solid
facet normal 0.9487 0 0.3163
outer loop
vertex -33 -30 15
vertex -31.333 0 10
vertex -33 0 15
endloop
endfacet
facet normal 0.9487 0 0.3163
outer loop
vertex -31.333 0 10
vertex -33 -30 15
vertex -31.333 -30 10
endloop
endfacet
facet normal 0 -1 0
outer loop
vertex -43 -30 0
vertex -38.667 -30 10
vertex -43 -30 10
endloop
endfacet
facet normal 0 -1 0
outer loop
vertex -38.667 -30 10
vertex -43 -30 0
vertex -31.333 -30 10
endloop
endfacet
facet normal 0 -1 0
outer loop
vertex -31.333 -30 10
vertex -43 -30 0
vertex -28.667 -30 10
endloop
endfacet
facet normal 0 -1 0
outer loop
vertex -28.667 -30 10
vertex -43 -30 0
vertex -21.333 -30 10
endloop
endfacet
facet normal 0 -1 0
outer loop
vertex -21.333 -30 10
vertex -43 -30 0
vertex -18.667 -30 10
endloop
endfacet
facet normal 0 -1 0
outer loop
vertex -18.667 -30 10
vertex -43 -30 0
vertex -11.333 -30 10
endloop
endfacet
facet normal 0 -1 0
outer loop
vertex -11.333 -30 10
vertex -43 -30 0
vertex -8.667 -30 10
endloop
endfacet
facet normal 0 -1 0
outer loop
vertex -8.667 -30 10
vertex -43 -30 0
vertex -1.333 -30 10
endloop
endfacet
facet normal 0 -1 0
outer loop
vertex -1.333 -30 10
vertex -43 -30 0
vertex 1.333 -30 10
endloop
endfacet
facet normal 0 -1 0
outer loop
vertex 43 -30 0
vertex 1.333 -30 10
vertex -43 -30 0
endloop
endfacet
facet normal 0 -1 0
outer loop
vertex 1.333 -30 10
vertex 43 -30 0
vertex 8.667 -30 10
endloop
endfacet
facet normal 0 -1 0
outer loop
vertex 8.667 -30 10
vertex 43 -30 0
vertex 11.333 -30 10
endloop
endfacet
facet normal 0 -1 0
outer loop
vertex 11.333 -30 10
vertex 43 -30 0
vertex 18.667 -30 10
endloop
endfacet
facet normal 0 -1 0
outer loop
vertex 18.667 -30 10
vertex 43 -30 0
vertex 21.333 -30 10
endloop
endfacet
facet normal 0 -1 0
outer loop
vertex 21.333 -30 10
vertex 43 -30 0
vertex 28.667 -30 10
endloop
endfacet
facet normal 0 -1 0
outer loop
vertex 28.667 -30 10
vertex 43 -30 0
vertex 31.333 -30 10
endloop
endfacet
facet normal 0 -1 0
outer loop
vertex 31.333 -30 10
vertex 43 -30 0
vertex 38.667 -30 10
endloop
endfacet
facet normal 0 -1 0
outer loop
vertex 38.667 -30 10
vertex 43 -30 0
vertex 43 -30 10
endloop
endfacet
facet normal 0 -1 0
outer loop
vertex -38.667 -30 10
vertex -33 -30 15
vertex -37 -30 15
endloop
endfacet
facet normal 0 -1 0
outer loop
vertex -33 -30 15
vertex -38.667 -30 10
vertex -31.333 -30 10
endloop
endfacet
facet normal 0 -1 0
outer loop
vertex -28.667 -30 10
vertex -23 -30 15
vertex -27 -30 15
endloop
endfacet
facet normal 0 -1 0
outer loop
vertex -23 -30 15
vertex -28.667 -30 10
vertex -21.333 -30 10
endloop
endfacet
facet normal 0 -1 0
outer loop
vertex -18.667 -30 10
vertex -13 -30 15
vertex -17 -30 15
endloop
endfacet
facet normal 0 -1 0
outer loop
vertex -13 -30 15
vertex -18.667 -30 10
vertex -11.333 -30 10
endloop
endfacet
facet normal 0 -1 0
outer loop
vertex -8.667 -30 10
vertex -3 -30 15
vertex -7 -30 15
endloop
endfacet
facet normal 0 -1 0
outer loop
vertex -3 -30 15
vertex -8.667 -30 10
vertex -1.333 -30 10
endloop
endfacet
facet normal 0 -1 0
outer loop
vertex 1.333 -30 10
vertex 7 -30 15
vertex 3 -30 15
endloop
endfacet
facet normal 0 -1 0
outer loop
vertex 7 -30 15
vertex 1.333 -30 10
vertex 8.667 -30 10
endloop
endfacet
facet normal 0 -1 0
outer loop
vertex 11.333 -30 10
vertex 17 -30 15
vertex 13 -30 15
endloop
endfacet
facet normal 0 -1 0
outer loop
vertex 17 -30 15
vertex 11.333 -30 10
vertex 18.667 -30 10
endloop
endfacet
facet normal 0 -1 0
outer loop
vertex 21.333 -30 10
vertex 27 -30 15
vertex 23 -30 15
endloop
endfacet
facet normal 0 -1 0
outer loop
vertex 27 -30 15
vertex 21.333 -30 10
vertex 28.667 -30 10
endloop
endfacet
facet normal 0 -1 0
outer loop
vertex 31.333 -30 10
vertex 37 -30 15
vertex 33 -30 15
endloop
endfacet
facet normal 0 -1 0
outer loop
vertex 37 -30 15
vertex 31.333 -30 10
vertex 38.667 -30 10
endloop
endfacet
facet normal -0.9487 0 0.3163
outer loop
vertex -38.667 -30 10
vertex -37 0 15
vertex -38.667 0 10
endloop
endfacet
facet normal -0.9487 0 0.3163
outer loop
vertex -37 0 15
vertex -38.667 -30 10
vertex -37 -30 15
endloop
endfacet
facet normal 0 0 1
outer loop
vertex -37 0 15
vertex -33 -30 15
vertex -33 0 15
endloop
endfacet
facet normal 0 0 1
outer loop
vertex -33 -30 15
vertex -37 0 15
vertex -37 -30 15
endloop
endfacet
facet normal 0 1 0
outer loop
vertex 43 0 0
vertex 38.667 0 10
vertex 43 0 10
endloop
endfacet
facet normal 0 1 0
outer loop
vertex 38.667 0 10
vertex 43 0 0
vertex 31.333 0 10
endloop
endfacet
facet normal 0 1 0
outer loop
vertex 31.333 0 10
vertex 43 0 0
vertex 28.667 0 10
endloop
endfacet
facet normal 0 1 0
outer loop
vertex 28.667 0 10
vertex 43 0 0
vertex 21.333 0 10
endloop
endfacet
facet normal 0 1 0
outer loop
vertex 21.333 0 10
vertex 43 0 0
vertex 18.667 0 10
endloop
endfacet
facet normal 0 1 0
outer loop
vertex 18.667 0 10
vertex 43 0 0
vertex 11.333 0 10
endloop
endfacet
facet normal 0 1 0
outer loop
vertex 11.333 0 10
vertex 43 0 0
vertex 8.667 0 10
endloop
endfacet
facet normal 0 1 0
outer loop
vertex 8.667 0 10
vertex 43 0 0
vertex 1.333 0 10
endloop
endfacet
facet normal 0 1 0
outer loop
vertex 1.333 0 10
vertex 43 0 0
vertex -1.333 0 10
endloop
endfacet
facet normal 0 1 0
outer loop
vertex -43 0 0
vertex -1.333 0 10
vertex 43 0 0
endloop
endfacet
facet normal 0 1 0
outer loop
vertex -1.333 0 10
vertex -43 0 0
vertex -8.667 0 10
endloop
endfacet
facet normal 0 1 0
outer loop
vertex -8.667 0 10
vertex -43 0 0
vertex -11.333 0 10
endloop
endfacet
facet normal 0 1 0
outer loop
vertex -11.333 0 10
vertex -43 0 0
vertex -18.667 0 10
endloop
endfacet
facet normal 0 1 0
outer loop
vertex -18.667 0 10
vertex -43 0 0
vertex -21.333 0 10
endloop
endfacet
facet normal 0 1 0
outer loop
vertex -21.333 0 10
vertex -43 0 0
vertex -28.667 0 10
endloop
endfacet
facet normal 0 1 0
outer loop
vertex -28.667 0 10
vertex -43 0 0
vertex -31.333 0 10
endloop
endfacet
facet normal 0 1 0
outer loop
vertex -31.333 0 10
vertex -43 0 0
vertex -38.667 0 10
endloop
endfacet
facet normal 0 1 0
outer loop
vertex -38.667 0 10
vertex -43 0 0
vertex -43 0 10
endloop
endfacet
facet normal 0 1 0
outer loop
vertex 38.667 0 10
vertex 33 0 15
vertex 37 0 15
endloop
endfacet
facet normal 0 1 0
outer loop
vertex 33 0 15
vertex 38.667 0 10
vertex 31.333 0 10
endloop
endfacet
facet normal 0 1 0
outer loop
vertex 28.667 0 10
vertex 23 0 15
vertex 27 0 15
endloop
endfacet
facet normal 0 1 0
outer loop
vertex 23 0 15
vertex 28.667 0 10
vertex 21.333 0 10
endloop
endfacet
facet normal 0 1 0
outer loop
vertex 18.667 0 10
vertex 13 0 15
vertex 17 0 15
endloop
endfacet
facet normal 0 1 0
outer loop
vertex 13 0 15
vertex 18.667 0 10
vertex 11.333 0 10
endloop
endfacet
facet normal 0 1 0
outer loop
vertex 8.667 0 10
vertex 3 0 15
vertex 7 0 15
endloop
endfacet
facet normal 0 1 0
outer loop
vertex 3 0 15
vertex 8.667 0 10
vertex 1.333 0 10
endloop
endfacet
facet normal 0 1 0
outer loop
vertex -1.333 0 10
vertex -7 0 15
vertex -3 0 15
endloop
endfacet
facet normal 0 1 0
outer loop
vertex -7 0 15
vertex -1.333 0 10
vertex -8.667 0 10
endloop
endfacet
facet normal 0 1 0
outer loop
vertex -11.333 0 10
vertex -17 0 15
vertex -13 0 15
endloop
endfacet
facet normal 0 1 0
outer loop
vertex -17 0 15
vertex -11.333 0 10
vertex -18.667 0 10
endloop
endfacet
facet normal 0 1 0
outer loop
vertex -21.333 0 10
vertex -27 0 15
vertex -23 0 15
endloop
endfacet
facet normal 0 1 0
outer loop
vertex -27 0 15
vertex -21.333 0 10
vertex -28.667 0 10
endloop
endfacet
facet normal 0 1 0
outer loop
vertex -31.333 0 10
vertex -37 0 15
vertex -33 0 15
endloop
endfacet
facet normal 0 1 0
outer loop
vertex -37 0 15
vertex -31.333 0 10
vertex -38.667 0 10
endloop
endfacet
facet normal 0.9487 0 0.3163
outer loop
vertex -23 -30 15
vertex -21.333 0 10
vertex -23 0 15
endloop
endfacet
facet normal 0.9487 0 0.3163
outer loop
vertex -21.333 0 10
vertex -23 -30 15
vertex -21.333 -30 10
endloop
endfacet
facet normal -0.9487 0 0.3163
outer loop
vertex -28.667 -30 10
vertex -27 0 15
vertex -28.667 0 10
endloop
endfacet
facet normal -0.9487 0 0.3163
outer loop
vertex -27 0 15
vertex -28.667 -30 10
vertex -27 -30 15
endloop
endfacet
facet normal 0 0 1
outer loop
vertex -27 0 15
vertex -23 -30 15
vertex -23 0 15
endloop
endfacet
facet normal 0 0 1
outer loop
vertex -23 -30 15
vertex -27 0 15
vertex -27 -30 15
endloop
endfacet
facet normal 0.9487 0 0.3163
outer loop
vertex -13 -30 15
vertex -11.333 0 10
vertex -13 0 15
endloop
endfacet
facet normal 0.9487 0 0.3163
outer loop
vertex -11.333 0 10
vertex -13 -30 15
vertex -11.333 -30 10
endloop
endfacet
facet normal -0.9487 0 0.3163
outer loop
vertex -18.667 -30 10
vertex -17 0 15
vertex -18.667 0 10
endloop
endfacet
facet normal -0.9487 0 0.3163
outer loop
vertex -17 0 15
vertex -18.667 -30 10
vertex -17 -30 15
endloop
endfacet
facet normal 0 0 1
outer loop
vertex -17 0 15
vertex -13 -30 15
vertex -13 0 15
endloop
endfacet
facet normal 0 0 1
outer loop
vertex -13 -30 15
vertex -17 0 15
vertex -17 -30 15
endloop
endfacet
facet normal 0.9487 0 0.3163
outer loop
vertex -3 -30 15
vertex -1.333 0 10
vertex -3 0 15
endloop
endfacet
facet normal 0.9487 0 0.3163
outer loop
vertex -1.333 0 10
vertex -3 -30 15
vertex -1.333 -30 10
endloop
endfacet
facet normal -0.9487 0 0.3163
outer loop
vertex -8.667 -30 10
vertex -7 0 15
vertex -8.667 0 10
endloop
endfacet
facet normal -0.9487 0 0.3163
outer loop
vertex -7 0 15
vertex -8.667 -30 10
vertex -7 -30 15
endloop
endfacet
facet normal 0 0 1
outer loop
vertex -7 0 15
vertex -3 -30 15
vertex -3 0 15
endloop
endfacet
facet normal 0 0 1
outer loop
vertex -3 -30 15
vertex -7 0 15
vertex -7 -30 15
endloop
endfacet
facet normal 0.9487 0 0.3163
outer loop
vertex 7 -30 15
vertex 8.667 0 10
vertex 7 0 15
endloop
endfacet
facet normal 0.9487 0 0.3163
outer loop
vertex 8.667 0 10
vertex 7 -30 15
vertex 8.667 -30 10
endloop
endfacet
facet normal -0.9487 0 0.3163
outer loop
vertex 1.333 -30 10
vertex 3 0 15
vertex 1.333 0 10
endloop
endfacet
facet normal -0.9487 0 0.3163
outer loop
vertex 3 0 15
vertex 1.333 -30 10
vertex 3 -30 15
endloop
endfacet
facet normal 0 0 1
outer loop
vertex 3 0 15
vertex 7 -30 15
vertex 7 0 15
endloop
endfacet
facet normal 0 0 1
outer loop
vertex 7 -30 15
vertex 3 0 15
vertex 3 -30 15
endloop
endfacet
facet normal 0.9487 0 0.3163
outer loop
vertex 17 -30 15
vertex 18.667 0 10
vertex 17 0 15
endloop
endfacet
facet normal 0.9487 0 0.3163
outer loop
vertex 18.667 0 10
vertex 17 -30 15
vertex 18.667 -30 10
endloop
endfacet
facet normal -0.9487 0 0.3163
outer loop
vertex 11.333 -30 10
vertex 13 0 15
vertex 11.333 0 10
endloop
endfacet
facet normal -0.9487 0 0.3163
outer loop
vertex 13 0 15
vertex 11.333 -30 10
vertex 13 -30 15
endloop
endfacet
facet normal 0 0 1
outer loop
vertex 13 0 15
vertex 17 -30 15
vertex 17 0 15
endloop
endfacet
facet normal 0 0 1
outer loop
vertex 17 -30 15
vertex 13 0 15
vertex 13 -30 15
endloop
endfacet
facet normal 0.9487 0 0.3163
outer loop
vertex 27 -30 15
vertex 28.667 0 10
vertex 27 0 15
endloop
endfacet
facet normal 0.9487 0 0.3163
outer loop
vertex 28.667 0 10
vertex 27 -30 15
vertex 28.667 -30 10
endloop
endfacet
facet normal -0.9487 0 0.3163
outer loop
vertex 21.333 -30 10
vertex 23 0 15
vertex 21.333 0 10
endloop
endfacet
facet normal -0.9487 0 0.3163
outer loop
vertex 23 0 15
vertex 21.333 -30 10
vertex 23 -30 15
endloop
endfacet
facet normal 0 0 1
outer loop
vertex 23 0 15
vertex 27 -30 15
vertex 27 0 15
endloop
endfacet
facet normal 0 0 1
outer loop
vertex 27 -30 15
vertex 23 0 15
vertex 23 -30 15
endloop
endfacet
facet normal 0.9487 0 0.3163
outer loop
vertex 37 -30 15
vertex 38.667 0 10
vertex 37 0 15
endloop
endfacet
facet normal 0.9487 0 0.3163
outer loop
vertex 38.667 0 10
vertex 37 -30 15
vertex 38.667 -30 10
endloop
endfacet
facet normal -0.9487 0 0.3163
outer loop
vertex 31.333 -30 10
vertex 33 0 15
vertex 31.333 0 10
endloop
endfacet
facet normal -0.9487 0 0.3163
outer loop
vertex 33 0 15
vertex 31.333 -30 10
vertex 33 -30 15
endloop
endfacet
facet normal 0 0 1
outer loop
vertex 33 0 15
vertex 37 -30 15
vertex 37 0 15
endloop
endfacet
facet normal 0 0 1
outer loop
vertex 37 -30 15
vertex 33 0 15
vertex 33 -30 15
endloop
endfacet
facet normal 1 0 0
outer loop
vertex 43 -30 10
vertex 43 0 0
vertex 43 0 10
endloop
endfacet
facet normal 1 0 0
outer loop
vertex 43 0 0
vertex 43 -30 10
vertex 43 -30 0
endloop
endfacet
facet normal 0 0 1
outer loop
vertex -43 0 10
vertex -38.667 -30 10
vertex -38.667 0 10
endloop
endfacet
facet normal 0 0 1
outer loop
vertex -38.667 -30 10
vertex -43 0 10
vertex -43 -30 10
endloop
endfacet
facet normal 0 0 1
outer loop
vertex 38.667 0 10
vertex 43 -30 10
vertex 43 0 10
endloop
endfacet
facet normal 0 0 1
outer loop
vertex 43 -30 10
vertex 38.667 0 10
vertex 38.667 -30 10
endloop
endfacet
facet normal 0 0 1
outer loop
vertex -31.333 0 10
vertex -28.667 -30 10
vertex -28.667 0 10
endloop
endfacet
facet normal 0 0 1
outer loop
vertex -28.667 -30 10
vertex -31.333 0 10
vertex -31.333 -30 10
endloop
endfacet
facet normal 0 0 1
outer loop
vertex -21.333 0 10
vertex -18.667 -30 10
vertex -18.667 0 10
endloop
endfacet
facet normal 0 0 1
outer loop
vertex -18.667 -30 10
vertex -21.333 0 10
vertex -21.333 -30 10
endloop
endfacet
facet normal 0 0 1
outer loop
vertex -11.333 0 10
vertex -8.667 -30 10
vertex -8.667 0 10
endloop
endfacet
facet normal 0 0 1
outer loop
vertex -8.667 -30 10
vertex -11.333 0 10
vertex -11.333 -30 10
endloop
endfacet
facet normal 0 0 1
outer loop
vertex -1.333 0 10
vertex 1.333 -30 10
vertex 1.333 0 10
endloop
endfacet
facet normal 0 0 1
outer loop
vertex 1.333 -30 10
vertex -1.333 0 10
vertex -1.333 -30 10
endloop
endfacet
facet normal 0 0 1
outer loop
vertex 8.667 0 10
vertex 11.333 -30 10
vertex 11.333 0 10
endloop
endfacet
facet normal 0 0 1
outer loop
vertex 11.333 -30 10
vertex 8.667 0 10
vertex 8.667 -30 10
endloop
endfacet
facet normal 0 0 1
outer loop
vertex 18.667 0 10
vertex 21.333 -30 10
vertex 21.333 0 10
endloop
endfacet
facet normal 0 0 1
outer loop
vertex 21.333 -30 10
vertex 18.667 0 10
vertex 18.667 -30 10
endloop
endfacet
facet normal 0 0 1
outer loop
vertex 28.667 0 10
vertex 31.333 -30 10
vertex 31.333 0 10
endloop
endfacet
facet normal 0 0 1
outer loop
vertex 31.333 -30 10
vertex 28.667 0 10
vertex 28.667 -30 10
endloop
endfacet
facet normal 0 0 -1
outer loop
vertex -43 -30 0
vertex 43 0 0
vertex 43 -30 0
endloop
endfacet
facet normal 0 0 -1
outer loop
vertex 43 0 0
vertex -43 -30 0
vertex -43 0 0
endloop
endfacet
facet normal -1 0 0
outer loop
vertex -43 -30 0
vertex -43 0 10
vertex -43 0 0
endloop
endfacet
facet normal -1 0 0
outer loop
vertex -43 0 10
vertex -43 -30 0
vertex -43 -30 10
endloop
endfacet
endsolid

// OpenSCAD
$fn = 32;

// ----------------------------------------------------------------------
// Toothed rack, 8 teeth
// 10 mm pitch, 5 mm teeth
// ----------------------------------------------------------------------

// --- parameters (mm) ---
bar_w = 30;   // bar width (Y)
bar_h = 10;   // bar height (Z)
teeth = 8;    // number of teeth
pitch = 10;   // tooth pitch
tooth_h = 5;  // tooth height above the bar
root_w = 8;   // tooth width at the root
crest_w = 4;  // tooth width at the crest

// --- derived feature positions (mm) ---
span = (teeth - 1) * pitch;  // = 70   distance between the outer teeth
bar_l = span + root_w + 8;   // = 86   bar length: teeth plus 4 mm at each end
tooth_x = -span / 2;         // = -35   X of the first tooth
height = bar_h + tooth_h;    // = 15   overall height
feature_centers = [
  [tooth_x + 0 * pitch, -bar_w / 2],
  [tooth_x + 1 * pitch, -bar_w / 2],
  [tooth_x + 2 * pitch, -bar_w / 2],
  [tooth_x + 3 * pitch, -bar_w / 2],
  [tooth_x + 4 * pitch, -bar_w / 2],
  [tooth_x + 5 * pitch, -bar_w / 2],
  [tooth_x + 6 * pitch, -bar_w / 2],
  [tooth_x + 7 * pitch, -bar_w / 2]
];   // tooth centre line, drives the tooth loop

// bar with a rack of teeth, one extruded trapezoium per centre
module rack_tooth() {
  linear_extrude(height = bar_w)
    polygon(points = [
      [0, 0],
      [root_w, 0],
      [root_w / 2 + crest_w / 2, tooth_h + 1],
      [root_w / 2 - crest_w / 2, tooth_h + 1]
    ]);
}

union() {
  translate([-bar_l / 2, -bar_w, 0]) cube([bar_l, bar_w, bar_h]);
  for (centre = feature_centers)
    translate([centre[0] - root_w / 2, 0, bar_h - 1]) rotate([90, 0, 0]) rack_tooth();
}
